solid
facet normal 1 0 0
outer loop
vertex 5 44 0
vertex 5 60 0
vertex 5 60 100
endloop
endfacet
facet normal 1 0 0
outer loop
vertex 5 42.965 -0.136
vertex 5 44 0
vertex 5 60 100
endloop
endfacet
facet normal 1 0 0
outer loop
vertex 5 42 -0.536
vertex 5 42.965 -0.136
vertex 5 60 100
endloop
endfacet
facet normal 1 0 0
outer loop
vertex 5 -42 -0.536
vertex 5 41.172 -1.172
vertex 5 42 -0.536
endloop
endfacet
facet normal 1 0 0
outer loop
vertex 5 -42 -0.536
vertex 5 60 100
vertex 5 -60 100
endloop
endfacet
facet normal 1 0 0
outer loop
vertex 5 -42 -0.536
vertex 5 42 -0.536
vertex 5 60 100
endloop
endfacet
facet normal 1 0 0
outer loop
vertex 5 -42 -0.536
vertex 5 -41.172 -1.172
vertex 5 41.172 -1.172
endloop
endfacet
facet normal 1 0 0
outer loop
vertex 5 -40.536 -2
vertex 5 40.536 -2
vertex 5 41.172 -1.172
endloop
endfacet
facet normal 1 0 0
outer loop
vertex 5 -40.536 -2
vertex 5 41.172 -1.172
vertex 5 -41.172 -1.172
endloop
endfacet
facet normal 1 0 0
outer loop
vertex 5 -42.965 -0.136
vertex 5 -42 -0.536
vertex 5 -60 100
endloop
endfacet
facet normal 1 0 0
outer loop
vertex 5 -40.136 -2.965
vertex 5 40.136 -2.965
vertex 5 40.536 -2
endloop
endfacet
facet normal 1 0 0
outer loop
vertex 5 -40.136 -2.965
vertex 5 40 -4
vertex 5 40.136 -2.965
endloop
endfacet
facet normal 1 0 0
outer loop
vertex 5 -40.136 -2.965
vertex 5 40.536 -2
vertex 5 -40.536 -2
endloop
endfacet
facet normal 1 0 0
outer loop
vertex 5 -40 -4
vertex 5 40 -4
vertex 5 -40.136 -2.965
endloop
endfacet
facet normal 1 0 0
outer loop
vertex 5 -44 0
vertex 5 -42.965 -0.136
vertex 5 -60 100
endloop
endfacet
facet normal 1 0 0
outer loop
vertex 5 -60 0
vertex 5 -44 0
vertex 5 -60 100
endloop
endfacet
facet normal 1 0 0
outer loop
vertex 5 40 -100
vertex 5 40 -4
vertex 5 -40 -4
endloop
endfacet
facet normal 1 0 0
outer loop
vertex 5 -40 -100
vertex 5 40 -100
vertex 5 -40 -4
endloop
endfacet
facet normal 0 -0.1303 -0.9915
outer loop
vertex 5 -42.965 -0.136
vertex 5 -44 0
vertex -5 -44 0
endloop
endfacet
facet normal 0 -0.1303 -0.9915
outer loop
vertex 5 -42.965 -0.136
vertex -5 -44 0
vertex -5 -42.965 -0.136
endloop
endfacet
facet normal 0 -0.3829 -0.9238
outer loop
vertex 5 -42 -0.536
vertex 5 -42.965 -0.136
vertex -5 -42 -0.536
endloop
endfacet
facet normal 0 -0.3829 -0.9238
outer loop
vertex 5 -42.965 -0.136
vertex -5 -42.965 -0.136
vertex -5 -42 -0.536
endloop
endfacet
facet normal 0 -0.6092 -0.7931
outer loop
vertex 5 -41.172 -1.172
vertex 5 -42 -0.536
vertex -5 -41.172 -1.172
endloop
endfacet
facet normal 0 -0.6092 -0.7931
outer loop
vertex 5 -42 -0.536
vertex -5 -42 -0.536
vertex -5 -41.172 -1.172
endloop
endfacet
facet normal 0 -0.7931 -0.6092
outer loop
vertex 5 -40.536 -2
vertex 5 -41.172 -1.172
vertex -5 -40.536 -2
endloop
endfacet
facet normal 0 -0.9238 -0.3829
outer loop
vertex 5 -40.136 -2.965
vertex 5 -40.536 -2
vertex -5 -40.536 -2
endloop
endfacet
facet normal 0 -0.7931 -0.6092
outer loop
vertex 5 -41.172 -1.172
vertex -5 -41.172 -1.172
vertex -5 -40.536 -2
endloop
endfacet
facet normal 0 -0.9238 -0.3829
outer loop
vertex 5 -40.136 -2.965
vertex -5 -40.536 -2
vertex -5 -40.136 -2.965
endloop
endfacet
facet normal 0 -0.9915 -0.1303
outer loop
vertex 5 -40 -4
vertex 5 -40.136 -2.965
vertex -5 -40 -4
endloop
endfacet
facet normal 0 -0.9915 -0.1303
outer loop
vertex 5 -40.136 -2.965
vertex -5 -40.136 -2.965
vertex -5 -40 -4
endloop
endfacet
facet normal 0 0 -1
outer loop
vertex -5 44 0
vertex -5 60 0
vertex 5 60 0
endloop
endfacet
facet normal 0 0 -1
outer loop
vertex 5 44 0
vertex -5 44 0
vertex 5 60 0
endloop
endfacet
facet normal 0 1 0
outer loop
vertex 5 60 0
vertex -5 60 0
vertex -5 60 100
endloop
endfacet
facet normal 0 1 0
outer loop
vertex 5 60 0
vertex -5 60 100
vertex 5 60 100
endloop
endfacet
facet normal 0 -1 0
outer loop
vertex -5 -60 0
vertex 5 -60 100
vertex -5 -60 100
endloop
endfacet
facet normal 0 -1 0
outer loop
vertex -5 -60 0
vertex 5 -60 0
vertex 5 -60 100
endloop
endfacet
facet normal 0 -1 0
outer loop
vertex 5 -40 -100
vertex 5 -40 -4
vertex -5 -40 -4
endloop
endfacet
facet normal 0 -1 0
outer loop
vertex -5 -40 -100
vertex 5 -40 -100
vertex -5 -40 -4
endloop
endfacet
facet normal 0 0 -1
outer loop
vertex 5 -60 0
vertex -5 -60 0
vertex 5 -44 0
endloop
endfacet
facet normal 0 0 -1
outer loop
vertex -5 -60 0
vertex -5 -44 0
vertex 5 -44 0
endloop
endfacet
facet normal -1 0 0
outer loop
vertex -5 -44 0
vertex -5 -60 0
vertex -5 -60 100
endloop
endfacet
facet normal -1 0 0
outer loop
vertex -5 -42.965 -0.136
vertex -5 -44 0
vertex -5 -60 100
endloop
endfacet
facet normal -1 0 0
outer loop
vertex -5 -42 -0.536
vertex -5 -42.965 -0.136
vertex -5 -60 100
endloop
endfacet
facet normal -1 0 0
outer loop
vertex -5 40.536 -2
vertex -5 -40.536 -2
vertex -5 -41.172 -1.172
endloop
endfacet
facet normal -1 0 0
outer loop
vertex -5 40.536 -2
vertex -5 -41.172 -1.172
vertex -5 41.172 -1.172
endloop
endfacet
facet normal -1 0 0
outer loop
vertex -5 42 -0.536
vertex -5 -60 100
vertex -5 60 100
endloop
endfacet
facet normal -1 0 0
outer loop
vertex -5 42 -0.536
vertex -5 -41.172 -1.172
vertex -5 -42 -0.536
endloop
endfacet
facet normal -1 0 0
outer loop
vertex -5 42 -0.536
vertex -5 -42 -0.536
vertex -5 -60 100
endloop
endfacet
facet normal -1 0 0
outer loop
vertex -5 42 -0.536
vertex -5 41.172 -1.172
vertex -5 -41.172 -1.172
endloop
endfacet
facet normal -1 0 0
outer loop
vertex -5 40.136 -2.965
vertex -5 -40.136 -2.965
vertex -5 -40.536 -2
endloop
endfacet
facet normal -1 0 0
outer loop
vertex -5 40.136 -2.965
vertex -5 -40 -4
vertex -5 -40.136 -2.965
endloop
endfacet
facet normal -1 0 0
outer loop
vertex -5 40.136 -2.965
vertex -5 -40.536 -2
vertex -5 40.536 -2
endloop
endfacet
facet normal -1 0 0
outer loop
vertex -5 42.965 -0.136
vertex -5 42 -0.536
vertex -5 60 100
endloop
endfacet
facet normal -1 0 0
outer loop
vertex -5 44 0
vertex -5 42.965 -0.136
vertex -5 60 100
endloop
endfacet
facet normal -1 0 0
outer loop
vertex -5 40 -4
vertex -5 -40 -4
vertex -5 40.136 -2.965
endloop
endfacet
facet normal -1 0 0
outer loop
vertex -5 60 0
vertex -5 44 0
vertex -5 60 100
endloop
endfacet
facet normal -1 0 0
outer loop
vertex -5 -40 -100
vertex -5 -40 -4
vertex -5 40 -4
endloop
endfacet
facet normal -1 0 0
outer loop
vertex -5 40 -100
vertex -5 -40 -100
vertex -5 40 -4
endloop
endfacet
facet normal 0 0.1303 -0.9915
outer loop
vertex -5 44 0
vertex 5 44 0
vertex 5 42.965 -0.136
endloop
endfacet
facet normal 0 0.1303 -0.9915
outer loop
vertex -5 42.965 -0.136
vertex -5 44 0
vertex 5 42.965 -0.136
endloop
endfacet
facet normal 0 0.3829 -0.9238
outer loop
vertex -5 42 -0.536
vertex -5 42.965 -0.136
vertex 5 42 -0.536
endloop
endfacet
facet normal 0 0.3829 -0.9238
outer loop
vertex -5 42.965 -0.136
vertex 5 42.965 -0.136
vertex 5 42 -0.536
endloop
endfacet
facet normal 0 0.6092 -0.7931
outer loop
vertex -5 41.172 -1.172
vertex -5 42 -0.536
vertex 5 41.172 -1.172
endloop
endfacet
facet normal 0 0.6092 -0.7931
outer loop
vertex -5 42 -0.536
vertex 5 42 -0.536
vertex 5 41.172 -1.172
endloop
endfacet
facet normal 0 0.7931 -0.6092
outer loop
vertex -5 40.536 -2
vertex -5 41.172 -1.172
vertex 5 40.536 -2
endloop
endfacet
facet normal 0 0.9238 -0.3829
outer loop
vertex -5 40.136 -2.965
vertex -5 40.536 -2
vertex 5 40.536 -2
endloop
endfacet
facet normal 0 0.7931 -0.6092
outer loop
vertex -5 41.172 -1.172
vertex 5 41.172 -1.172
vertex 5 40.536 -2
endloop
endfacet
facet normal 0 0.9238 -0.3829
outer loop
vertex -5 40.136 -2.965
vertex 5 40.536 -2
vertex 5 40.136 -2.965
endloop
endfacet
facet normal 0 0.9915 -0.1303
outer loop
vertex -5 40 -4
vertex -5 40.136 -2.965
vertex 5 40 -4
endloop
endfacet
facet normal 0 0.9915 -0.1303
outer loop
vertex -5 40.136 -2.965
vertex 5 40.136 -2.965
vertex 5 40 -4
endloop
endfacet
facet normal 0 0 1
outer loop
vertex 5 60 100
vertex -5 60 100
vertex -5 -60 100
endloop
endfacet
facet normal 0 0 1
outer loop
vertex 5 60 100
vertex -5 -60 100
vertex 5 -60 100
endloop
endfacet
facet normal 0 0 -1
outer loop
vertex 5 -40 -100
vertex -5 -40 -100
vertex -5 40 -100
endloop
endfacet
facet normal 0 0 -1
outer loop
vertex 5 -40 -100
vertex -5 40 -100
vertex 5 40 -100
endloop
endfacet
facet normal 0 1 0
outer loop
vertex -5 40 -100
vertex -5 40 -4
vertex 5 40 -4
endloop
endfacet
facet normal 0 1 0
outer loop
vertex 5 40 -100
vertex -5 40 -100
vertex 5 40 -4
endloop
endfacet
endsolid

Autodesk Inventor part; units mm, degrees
ref_plane "YZ Plane" through (0, 0, 0) normal (1, 0, 0) x (0, 1, 0)
ref_plane "XZ Plane" through (0, 0, 0) normal (0, 1, 0) x (-1, 0, 0)
ref_plane "XY Plane" through (0, 0, 0) normal (0, 0, 1) x (1, 0, 0)
sketch "Schizzo1" plane through (0, 0, 0) normal (0, 0, 1) x (1, 0, 0)
  line L0 (-5, 60) -> (5, 60)
  line L1 (5, 60) -> (5, -60)
  line L2 (5, -60) -> (-5, -60)
  line L3 (-5, -60) -> (-5, 60)
  line L4 (-5, 60) -> (5, -60) construction
  line L5 (5, 60) -> (-5, -60) construction
  line L6 (-5, 40) -> (5, 40)
  line L7 (5, 40) -> (5, -40)
  line L8 (5, -40) -> (-5, -40)
  line L9 (-5, -40) -> (-5, 40)
  line L10 (-5, 40) -> (5, -40) construction
  line L11 (5, 40) -> (-5, -40) construction
  line L12 (0, 0) -> (121.0573, 0)
  line L13 (0, 0) -> (0, 96.1234)
  dimension "d0" = 120
  dimension "d1" = 10
  dimension "d2" = 80
extrude "Estrusione1" add sketch "Schizzo1" along normal blind 100
extrude "Estrusione2" add sketch "Schizzo1" against normal blind 100 contours L6 L13 L12 L1 L8 L3 | L6 L1 L12 L13
fillet "Raccordo1" radius 4 2 edges at (0, 40, 0) (0, -40, 0)
properties part number "05-23-2023 FEM"
